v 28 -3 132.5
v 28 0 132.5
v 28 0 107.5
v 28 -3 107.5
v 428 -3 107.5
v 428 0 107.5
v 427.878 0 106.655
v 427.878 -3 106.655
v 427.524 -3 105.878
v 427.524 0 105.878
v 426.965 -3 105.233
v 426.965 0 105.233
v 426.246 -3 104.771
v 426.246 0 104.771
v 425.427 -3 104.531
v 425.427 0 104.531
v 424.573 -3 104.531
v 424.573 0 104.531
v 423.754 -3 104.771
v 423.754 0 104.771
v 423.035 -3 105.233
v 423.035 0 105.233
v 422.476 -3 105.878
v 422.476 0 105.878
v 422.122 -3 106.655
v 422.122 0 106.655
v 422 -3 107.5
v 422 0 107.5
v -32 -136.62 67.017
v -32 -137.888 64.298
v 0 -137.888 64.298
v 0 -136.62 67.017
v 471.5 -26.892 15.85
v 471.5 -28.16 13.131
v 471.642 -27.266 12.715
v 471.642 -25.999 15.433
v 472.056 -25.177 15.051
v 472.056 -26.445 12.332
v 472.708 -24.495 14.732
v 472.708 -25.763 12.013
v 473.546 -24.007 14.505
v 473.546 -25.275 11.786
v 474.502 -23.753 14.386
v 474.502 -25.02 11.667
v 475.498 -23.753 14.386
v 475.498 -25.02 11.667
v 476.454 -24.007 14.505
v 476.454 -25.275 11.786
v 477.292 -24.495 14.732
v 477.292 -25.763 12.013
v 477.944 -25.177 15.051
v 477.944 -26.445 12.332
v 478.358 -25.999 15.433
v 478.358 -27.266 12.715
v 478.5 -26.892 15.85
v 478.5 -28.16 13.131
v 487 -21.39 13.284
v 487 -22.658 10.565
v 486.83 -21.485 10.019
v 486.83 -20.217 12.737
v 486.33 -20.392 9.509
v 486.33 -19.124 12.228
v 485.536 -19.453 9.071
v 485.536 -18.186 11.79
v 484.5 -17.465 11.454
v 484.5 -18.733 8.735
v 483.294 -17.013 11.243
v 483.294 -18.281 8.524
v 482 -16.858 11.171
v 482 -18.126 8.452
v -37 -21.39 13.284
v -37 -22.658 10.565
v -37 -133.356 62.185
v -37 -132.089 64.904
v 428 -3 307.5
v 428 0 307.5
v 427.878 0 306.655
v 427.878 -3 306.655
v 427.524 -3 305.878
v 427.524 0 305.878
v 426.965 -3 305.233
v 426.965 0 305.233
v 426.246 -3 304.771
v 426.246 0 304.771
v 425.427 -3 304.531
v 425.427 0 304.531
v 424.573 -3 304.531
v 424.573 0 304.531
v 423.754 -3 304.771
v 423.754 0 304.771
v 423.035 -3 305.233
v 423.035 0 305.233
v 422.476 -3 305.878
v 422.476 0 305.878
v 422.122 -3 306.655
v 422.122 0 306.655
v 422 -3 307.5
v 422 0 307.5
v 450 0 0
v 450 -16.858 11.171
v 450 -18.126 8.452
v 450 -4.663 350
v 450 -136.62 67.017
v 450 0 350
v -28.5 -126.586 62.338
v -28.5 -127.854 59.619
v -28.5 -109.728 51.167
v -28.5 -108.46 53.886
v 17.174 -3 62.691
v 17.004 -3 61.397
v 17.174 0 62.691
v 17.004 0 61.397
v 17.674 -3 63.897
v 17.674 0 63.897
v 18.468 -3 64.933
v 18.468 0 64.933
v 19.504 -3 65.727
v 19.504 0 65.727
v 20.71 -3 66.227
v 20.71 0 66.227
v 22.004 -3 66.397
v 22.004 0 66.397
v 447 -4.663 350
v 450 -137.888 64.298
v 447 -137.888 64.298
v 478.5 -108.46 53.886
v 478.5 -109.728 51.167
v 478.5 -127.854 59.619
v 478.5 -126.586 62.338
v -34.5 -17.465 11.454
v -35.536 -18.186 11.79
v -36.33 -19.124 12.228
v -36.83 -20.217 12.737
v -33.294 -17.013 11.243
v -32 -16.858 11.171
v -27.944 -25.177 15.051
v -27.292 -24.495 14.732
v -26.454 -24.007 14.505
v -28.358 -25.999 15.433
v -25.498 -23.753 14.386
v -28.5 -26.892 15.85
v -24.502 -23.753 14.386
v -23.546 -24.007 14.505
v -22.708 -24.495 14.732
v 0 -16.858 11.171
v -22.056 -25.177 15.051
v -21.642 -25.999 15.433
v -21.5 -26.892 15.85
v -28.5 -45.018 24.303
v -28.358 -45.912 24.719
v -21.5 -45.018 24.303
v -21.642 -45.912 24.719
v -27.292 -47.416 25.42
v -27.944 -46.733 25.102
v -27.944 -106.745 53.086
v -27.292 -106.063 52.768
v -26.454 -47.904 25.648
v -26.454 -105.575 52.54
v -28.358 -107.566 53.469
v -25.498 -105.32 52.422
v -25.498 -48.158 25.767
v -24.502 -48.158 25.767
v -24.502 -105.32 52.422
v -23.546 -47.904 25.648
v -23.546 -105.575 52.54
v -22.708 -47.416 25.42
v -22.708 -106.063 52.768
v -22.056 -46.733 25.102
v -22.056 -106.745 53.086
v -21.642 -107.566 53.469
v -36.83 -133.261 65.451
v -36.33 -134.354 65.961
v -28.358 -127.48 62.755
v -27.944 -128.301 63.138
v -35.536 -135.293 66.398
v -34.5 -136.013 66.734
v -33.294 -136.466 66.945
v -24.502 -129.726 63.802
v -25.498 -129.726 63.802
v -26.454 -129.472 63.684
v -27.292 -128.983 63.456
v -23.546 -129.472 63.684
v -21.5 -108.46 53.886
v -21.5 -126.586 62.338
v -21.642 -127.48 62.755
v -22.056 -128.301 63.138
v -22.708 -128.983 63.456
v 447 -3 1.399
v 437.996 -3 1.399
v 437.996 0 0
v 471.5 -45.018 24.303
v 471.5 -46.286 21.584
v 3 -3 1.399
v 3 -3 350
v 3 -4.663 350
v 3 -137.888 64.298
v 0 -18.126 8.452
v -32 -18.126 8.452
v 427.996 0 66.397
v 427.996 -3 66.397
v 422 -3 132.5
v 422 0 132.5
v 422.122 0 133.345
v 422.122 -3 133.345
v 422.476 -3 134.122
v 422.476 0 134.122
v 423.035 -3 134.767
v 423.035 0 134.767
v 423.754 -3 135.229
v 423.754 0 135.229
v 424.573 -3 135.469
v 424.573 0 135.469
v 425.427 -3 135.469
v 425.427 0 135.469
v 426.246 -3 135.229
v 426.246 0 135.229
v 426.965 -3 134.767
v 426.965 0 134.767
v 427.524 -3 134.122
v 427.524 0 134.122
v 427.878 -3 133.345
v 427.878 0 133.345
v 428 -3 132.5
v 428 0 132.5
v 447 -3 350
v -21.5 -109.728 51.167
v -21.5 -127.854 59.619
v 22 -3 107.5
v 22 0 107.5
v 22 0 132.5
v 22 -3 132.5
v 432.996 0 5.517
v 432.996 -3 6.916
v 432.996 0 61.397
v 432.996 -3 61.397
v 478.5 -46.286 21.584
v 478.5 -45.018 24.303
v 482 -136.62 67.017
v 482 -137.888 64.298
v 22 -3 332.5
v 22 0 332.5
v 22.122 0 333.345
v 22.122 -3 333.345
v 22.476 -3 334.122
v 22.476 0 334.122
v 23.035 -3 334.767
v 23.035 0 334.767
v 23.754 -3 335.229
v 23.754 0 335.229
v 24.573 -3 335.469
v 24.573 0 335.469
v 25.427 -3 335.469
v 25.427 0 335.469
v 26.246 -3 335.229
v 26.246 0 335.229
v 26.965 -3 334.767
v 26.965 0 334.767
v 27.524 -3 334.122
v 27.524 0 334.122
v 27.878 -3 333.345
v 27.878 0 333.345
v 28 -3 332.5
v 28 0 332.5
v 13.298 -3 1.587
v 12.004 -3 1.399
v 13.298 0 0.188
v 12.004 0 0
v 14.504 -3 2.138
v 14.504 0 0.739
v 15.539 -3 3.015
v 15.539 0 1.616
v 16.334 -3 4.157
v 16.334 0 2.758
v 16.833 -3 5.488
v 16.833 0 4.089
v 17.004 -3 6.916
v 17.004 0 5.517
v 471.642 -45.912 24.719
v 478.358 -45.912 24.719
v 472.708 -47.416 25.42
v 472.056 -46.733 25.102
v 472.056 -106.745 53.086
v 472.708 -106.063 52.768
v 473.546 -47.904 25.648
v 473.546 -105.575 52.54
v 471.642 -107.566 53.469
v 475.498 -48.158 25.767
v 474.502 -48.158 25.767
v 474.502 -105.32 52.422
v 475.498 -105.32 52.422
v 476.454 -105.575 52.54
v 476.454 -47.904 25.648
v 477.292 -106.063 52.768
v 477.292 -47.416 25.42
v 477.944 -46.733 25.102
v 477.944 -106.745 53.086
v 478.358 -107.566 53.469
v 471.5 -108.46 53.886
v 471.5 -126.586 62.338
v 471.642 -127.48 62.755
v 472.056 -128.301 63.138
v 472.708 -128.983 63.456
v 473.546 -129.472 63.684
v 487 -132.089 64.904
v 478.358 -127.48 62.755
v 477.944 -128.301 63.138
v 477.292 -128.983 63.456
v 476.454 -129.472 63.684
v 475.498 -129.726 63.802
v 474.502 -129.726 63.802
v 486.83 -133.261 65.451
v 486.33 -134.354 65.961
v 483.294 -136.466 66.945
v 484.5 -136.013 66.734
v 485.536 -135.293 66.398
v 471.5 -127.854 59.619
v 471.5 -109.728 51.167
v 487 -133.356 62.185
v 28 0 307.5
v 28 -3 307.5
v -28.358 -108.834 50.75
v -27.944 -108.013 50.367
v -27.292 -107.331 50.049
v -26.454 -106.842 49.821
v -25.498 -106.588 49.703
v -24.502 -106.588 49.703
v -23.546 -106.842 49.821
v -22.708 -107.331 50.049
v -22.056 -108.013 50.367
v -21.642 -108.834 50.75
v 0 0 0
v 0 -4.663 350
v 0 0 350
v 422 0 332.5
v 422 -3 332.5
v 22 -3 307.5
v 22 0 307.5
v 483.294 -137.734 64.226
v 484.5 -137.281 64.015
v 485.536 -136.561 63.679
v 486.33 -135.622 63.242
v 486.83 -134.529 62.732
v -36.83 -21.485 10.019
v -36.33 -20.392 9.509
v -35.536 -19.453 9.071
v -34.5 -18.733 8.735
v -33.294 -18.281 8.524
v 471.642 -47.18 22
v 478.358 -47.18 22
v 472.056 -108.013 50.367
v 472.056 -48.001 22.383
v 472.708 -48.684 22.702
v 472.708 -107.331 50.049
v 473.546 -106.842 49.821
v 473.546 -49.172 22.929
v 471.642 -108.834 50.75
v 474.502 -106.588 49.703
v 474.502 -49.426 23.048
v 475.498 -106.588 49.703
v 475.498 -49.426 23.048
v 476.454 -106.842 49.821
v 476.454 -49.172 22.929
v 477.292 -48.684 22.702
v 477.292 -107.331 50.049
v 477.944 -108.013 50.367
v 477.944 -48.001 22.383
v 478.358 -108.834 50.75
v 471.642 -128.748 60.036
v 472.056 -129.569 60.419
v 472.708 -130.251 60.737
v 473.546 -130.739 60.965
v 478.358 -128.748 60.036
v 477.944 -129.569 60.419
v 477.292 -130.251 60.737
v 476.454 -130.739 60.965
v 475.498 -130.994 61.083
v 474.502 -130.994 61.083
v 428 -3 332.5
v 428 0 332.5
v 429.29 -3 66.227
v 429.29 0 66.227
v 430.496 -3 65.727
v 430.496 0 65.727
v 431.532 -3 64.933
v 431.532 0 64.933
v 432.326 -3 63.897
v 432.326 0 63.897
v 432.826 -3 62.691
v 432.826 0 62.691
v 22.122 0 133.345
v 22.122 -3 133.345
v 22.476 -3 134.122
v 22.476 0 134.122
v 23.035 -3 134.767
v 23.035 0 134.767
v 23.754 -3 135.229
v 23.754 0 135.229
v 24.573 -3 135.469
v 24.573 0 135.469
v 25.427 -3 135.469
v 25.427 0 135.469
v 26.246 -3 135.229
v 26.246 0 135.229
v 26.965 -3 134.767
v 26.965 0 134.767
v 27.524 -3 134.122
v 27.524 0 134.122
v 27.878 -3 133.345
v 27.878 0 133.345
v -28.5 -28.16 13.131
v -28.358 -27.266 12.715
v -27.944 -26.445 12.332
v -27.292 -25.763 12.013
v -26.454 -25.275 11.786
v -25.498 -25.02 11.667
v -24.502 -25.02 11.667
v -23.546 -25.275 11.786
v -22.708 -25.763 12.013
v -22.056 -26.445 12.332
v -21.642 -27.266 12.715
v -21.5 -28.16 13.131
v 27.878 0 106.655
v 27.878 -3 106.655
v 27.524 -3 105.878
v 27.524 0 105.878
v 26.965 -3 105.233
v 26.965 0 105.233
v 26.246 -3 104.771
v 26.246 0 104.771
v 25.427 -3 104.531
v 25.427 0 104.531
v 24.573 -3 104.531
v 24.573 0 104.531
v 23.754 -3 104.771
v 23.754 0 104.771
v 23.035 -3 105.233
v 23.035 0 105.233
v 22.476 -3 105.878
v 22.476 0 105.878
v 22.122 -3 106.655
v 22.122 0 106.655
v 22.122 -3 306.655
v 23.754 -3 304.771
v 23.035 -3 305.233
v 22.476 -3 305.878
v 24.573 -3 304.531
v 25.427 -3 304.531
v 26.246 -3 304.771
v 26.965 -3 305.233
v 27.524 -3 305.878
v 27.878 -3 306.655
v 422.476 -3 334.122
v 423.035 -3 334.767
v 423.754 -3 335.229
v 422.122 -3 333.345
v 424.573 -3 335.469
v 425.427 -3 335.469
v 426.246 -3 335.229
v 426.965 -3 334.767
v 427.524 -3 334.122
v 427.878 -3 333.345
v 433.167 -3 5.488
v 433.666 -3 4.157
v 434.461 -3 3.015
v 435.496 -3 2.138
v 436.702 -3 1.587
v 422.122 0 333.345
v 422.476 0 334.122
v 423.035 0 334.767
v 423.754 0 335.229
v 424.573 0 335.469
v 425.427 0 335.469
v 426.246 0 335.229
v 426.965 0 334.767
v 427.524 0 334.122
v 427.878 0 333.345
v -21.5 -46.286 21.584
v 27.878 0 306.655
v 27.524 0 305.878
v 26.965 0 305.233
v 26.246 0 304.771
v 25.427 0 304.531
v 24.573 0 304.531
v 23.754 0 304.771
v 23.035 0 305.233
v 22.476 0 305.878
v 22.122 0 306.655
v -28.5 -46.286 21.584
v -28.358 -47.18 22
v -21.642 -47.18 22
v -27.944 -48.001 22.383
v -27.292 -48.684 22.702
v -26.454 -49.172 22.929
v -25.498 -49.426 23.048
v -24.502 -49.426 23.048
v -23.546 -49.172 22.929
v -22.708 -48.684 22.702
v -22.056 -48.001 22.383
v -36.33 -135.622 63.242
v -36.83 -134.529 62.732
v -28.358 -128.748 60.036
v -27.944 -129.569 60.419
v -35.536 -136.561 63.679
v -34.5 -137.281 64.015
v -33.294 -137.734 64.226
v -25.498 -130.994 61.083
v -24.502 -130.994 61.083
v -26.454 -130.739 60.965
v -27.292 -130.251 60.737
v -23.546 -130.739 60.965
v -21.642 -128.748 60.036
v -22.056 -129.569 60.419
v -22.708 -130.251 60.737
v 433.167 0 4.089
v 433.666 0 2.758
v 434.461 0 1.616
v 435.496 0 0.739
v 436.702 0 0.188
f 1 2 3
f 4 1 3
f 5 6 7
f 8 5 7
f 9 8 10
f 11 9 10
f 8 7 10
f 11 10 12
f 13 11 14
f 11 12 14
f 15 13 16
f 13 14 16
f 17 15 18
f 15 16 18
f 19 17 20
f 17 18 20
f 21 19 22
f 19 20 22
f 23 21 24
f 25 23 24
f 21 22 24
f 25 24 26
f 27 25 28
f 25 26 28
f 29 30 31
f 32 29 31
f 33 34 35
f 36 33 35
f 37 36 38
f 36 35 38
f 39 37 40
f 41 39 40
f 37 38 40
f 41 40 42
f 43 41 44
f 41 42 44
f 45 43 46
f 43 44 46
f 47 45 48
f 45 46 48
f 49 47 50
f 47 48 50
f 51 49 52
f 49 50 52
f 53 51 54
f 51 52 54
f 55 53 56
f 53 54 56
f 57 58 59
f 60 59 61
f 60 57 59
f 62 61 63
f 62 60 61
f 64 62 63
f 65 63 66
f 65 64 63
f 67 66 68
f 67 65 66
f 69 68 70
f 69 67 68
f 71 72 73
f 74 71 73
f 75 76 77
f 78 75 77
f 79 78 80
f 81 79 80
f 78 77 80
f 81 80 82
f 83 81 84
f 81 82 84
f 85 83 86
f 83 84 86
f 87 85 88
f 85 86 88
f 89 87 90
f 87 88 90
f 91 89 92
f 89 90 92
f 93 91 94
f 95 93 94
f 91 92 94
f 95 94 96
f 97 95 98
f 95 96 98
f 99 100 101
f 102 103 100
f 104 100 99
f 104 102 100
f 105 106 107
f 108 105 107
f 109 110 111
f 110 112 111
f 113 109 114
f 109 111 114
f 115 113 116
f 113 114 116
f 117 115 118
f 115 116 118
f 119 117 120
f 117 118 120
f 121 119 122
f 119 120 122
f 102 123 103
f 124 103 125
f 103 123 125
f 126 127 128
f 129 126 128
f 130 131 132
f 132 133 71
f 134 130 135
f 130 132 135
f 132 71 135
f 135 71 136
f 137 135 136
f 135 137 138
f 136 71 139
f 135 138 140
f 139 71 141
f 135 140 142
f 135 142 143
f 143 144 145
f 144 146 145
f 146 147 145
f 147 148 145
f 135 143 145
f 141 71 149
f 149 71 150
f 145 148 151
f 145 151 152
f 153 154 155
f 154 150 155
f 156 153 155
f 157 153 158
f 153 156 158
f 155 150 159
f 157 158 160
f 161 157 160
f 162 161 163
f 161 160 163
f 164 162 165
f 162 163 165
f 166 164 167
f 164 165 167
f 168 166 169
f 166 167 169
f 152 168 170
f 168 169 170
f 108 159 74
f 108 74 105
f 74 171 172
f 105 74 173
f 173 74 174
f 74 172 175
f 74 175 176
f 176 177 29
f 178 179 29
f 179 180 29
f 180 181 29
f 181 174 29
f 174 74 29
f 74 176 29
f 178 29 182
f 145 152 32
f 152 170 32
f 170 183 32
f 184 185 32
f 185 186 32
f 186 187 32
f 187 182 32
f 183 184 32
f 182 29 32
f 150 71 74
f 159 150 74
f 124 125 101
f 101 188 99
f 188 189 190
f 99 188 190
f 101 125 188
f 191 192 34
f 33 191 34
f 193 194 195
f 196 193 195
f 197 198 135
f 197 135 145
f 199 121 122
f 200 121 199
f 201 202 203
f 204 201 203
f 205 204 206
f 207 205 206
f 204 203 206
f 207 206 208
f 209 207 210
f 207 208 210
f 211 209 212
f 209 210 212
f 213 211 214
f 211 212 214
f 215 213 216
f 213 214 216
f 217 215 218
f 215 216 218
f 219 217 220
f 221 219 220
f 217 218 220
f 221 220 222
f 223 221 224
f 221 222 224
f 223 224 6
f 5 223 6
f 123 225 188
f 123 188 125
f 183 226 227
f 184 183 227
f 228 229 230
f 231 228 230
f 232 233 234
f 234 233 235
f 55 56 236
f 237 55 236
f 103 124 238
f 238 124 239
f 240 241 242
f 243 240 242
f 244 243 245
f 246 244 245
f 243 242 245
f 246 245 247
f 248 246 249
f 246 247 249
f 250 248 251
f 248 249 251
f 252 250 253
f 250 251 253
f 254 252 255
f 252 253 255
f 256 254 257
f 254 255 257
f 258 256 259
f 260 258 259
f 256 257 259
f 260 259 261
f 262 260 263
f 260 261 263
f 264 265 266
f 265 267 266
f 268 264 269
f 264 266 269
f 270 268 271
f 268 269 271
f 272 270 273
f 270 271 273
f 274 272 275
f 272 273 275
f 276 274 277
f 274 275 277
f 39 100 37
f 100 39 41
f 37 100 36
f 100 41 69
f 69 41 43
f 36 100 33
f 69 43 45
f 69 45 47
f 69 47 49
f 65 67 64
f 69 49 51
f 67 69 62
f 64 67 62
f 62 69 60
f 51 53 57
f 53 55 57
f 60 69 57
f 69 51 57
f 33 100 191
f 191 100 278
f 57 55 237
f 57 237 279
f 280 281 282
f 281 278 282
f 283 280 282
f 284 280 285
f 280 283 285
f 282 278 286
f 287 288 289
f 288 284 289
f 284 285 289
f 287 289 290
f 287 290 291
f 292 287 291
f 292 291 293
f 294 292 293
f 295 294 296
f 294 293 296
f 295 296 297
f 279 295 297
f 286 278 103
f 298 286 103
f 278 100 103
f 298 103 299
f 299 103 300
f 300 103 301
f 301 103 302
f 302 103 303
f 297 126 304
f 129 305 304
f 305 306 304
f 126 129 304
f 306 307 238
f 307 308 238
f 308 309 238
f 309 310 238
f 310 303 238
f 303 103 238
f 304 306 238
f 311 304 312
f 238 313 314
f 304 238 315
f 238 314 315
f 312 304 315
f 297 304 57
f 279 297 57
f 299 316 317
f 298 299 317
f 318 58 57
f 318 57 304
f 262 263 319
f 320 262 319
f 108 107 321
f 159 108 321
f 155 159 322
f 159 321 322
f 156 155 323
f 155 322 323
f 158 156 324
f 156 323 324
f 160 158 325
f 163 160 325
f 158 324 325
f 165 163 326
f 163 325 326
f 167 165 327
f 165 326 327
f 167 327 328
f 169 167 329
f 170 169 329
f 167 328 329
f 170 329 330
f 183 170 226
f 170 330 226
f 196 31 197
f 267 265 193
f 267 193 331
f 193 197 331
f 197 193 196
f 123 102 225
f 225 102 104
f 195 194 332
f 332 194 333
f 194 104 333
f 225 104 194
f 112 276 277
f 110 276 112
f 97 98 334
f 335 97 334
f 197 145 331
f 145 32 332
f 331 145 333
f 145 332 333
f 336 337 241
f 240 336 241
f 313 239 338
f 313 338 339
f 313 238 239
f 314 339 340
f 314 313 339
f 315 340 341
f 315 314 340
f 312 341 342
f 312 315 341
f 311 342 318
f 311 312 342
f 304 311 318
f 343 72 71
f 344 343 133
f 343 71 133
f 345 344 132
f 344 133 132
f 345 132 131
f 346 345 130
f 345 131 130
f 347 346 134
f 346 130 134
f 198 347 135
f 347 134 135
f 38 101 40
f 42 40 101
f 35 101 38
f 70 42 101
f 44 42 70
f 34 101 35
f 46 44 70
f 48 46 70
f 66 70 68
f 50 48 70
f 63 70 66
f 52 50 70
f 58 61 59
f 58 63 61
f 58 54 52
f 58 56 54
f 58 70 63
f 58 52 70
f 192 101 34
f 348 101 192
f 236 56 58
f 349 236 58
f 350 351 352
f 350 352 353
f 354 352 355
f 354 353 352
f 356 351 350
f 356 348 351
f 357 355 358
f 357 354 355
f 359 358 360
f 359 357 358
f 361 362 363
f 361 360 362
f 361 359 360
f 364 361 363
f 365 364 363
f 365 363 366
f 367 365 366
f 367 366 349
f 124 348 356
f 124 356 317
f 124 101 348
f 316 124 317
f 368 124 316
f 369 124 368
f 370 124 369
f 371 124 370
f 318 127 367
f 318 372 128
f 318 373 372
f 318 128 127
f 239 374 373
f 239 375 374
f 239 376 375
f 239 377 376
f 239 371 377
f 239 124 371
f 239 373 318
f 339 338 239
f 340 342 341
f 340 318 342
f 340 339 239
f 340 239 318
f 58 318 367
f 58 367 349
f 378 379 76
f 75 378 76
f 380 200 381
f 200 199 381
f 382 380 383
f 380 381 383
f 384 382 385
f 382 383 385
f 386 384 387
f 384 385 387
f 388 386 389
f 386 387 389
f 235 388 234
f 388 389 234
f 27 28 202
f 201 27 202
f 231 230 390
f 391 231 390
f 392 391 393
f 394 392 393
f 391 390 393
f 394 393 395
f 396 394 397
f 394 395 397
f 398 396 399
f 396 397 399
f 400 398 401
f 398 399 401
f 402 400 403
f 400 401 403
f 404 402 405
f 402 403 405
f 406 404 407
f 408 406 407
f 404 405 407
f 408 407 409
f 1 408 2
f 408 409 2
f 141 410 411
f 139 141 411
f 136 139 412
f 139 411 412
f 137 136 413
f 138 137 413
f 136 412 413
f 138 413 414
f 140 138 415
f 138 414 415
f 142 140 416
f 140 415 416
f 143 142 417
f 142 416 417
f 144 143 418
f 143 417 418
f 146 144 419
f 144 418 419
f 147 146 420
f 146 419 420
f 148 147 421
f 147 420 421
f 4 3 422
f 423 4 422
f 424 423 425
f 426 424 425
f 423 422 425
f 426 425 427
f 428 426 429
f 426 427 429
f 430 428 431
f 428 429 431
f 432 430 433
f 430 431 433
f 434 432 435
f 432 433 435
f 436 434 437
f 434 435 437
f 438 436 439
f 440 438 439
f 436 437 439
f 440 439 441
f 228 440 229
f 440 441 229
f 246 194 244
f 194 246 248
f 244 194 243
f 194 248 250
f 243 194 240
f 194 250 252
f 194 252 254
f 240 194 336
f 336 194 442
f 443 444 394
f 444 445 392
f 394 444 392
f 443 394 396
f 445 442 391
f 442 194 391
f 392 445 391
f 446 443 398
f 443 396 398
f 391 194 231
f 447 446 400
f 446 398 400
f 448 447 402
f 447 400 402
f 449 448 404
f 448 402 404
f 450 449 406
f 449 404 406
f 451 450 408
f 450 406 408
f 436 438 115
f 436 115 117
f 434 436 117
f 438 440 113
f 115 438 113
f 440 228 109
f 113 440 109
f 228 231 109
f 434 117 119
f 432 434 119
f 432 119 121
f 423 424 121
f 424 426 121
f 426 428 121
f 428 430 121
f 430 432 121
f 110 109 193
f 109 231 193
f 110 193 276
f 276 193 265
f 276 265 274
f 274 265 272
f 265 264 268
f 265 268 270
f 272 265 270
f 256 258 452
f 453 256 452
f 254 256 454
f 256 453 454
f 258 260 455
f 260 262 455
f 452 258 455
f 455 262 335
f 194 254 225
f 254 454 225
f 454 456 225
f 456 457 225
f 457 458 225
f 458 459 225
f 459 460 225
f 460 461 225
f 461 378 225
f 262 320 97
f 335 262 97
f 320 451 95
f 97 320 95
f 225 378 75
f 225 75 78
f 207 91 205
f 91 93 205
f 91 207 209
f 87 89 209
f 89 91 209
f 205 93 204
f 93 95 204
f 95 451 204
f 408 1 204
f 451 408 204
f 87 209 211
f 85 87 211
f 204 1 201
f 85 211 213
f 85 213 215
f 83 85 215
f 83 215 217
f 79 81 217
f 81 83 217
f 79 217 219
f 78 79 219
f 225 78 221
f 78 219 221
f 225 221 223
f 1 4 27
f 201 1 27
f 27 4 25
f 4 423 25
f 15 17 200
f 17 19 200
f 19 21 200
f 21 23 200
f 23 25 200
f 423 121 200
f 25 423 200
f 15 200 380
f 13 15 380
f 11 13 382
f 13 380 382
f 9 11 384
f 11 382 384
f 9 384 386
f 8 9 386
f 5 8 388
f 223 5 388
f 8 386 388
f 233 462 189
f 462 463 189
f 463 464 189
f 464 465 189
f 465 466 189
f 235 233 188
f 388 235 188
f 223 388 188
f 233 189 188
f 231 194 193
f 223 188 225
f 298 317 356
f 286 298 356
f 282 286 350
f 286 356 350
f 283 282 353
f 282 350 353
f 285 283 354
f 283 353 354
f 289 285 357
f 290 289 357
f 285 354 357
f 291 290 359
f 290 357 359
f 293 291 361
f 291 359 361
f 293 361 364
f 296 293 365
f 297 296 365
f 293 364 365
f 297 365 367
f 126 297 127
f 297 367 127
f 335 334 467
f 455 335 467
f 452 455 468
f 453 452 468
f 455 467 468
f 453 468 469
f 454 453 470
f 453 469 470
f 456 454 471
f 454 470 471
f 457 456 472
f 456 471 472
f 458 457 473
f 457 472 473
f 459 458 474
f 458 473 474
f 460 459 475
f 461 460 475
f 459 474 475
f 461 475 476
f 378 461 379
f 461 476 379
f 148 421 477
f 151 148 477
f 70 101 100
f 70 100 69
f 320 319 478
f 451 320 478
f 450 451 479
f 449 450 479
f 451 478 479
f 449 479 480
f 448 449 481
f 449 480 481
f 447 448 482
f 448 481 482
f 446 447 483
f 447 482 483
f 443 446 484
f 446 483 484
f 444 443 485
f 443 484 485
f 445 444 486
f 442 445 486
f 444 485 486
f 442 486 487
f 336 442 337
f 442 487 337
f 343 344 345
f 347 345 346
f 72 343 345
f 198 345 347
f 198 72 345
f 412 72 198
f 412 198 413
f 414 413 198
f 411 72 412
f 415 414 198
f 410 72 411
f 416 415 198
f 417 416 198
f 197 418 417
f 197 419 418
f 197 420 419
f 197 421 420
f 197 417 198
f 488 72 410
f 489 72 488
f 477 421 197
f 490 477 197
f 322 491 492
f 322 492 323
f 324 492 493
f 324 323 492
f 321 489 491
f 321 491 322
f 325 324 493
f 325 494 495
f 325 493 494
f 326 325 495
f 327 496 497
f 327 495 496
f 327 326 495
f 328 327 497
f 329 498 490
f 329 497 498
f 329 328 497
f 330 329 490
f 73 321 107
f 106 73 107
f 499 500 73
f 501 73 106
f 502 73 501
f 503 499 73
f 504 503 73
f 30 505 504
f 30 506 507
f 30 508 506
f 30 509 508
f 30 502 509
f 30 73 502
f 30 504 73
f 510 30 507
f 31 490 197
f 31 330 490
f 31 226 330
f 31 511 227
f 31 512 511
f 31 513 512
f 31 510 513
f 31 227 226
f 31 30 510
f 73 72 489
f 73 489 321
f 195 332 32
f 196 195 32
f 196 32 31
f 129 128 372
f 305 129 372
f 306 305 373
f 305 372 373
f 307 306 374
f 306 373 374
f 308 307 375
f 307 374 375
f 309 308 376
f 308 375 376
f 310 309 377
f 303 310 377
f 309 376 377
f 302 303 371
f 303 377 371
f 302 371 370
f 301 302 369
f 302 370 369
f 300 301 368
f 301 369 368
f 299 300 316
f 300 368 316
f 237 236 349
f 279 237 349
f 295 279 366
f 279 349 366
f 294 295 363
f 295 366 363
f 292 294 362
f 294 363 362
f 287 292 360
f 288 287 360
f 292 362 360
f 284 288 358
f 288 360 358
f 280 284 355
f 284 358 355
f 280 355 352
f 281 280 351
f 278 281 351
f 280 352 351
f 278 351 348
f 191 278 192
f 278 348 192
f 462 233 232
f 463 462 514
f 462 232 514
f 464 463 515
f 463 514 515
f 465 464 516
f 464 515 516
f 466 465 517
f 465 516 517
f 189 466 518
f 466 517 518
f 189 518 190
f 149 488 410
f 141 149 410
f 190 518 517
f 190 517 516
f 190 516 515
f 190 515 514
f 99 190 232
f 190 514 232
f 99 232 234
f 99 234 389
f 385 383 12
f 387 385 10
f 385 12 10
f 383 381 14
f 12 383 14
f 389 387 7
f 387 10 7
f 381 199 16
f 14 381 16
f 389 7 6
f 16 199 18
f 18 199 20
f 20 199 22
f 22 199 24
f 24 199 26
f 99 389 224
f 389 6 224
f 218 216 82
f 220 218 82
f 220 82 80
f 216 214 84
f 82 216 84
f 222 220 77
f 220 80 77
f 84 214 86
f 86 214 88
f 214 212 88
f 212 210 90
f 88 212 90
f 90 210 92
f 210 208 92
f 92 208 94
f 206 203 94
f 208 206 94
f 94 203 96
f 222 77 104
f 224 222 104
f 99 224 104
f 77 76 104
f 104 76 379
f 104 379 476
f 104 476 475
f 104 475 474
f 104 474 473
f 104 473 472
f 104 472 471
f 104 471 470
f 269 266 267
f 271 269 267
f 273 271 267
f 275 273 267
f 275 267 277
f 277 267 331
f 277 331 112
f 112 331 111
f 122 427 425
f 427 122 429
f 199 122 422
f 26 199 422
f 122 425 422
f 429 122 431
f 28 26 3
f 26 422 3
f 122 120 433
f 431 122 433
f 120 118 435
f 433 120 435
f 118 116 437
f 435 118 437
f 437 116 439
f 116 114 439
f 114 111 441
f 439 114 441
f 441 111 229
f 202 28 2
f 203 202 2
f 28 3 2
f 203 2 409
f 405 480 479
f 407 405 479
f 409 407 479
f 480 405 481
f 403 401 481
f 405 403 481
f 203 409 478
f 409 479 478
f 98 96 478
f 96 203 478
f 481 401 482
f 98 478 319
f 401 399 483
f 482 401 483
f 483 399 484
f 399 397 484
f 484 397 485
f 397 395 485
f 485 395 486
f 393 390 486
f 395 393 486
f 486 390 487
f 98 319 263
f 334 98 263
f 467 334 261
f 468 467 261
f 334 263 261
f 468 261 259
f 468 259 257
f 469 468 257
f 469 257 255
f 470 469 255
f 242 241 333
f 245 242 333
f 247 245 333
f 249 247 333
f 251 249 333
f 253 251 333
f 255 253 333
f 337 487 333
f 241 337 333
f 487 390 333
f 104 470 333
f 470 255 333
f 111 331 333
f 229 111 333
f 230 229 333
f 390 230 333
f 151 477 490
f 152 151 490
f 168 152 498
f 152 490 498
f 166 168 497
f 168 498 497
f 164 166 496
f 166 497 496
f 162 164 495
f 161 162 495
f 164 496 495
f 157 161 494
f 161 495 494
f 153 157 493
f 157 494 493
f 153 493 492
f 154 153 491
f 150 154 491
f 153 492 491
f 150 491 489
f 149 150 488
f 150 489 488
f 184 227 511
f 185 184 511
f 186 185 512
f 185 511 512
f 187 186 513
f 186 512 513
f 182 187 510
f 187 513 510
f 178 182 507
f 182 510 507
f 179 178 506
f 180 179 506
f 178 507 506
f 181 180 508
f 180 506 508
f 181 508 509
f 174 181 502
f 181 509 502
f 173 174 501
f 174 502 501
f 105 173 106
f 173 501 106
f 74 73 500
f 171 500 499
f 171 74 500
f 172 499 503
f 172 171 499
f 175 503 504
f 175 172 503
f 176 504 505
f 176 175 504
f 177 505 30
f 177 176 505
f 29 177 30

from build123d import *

# Parameters (mm, degrees)
F1_DEPTH  = 450
F2_W      = 444
F2_H      = 164.8707569358
F3_DEPTH  = 360.001
F5_DEPTH  = 450.001
F6_W      = 40
F6_H      = 132.1425742267
F7_DEPTH  = 3
F8_R      = 5
F9_R      = 5
F10_R     = 5
F11_R     = 5
F13_DEPTH = 326.2718033332
F15_DEPTH = 25
F16_W     = 415.9923672676
F16_H     = 66.3970857859
F17_DEPTH = 25
F18_W     = 450
F18_H     = 10
F19_DEPTH = 137.8889997614
F20_R     = 5
F21_R     = 5
F22_R     = 5


with BuildPart() as f1:
    # F0 (on Right) → F1 (new body)
    with BuildSketch(Plane.YZ):
        Polygon((0, 0), (0, 360), (-167.8707569358, 0), align=None)
    extrude(amount=F1_DEPTH)

    # F2 (on face) → F3 (cut, through all)
    with BuildSketch(Plane(origin=(0, 0, 0), x_dir=(1, 0, 0), z_dir=(0, 0, -1))):
        with Locations((225, 85.4353784679)):
            Rectangle(F2_W, F2_H)
    extrude(amount=-F3_DEPTH, mode=Mode.SUBTRACT)

    # F4 (on face) → F5 (cut, through all)
    with BuildSketch(Plane(origin=(0, 0, 0), x_dir=(0, -1, 0), z_dir=(-1, 0, 0))):
        Polygon((167.8707569358, 0), (137.8879997614, 64.2982302564), (0, 0), align=None)
    extrude(amount=-F5_DEPTH, mode=Mode.SUBTRACT)

    # F6 (on face) → F7 (join)
    with BuildSketch(Plane(origin=(0, 0, 0), x_dir=(1, 0, 0), z_dir=(0, -0.4226182617, -0.906307787))):
        with Locations((-17, 86.0712871133)):
            Rectangle(F6_W, F6_H)
        with Locations((467, 86.0712871133)):
            Rectangle(F6_W, F6_H)
    extrude(amount=-F7_DEPTH)

    # F8
    f8_edges = [f1.edges().sort_by_distance(p)[0] for p in [
        (-37, -137.254072, 65.657692),
    ]]
    fillet(f8_edges, radius=F8_R)

    # F9
    f9_edges = [f1.edges().sort_by_distance(p)[0] for p in [
        (487, -137.254072, 65.657692),
    ]]
    fillet(f9_edges, radius=F9_R)

    # F10
    f10_edges = [f1.edges().sort_by_distance(p)[0] for p in [
        (487, -17.492228, 9.811827),
    ]]
    fillet(f10_edges, radius=F10_R)

    # F11
    f11_edges = [f1.edges().sort_by_distance(p)[0] for p in [
        (-37, -17.492228, 9.811827),
    ]]
    fillet(f11_edges, radius=F11_R)

    # F12 (on face) → F13 (cut, through all)
    with BuildSketch(Plane(origin=(0, 0, 0), x_dir=(1, 0, 0), z_dir=(0, -0.4226182617, -0.906307787))):
        with BuildLine():
            ThreePointArc((-28.5, 121.0712871133), (-25, 117.5712871133), (-21.5, 121.0712871133))
            Line((-21.5, 121.0712871133), (-21.5, 141.0712871133))
            ThreePointArc((-21.5, 141.0712871133), (-25, 144.5712871133), (-28.5, 141.0712871133))
            Line((-28.5, 141.0712871133), (-28.5, 121.0712871133))
        make_face()
        with BuildLine():
            ThreePointArc((-21.5, 51.0712871133), (-25, 54.5712871133), (-28.5, 51.0712871133))
            Line((-28.5, 51.0712871133), (-28.5, 31.0712871133))
            ThreePointArc((-28.5, 31.0712871133), (-25, 27.5712871133), (-21.5, 31.0712871133))
            Line((-21.5, 31.0712871133), (-21.5, 51.0712871133))
        make_face()
        with BuildLine():
            ThreePointArc((471.5, 121.0712871133), (475, 117.5712871133), (478.5, 121.0712871133))
            Line((478.5, 121.0712871133), (478.5, 141.0712871133))
            ThreePointArc((478.5, 141.0712871133), (475, 144.5712871133), (471.5, 141.0712871133))
            Line((471.5, 141.0712871133), (471.5, 121.0712871133))
        make_face()
        with BuildLine():
            Line((478.5, 31.0712871133), (478.5, 51.0712871133))
            ThreePointArc((478.5, 51.0712871133), (475, 54.5712871133), (471.5, 51.0712871133))
            Line((471.5, 51.0712871133), (471.5, 31.0712871133))
            ThreePointArc((471.5, 31.0712871133), (475, 27.5712871133), (478.5, 31.0712871133))
        make_face()
    extrude(amount=-F13_DEPTH, mode=Mode.SUBTRACT)

    # F14 (on face) → F15 (cut)
    with BuildSketch(Plane(origin=(0, 0, 0), x_dir=(-1, 0, 0), z_dir=(0, 1, 0))):
        with BuildLine():
            ThreePointArc((-428, 307.5), (-425, 304.5), (-422, 307.5))
            Line((-422, 307.5), (-422, 332.5))
            ThreePointArc((-422, 332.5), (-425, 335.5), (-428, 332.5))
            Line((-428, 332.5), (-428, 307.5))
        make_face()
        with BuildLine():
            Line((-28, 332.5), (-28, 307.5))
            ThreePointArc((-28, 307.5), (-25, 304.5), (-22, 307.5))
            Line((-22, 307.5), (-22, 332.5))
            ThreePointArc((-22, 332.5), (-25, 335.5), (-28, 332.5))
        make_face()
        with BuildLine():
            ThreePointArc((-422, 132.5), (-425, 135.5), (-428, 132.5))
            Line((-428, 132.5), (-428, 107.5))
            ThreePointArc((-428, 107.5), (-425, 104.5), (-422, 107.5))
            Line((-422, 107.5), (-422, 132.5))
        make_face()
        with BuildLine():
            ThreePointArc((-22, 132.5), (-25, 135.5), (-28, 132.5))
            Line((-28, 132.5), (-28, 107.5))
            ThreePointArc((-28, 107.5), (-25, 104.5), (-22, 107.5))
            Line((-22, 107.5), (-22, 132.5))
        make_face()
    extrude(amount=-F15_DEPTH, mode=Mode.SUBTRACT)

    # F16 (on face) → F17 (cut)
    with BuildSketch(Plane.XZ.offset(3)):
        with Locations((225, 33.1985428929)):
            Rectangle(F16_W, F16_H)
    extrude(amount=-F17_DEPTH, mode=Mode.SUBTRACT)

    # F18 (on face) → F19 (cut, through all)
    with BuildSketch(Plane(origin=(0, 0, 0), x_dir=(-1, 0, 0), z_dir=(0, 1, 0))):
        with Locations((-225, 355)):
            Rectangle(F18_W, F18_H)
    extrude(amount=-F19_DEPTH, mode=Mode.SUBTRACT)

    # F20
    f20_edges = [f1.edges().sort_by_distance(p)[0] for p in [
        (17.003816, -1.5, 0.699461),
    ]]
    fillet(f20_edges, radius=F20_R)

    # F21
    f21_edges = [f1.edges().sort_by_distance(p)[0] for p in [
        (17.003816, -1.5, 66.397086),
    ]]
    fillet(f21_edges, radius=F21_R)

    # F22
    f22_edges = [f1.edges().sort_by_distance(p)[0] for p in [
        (432.996184, -1.5, 66.397086),
        (432.996184, -1.5, 0.699461),
    ]]
    fillet(f22_edges, radius=F22_R)


solid = f1.part
